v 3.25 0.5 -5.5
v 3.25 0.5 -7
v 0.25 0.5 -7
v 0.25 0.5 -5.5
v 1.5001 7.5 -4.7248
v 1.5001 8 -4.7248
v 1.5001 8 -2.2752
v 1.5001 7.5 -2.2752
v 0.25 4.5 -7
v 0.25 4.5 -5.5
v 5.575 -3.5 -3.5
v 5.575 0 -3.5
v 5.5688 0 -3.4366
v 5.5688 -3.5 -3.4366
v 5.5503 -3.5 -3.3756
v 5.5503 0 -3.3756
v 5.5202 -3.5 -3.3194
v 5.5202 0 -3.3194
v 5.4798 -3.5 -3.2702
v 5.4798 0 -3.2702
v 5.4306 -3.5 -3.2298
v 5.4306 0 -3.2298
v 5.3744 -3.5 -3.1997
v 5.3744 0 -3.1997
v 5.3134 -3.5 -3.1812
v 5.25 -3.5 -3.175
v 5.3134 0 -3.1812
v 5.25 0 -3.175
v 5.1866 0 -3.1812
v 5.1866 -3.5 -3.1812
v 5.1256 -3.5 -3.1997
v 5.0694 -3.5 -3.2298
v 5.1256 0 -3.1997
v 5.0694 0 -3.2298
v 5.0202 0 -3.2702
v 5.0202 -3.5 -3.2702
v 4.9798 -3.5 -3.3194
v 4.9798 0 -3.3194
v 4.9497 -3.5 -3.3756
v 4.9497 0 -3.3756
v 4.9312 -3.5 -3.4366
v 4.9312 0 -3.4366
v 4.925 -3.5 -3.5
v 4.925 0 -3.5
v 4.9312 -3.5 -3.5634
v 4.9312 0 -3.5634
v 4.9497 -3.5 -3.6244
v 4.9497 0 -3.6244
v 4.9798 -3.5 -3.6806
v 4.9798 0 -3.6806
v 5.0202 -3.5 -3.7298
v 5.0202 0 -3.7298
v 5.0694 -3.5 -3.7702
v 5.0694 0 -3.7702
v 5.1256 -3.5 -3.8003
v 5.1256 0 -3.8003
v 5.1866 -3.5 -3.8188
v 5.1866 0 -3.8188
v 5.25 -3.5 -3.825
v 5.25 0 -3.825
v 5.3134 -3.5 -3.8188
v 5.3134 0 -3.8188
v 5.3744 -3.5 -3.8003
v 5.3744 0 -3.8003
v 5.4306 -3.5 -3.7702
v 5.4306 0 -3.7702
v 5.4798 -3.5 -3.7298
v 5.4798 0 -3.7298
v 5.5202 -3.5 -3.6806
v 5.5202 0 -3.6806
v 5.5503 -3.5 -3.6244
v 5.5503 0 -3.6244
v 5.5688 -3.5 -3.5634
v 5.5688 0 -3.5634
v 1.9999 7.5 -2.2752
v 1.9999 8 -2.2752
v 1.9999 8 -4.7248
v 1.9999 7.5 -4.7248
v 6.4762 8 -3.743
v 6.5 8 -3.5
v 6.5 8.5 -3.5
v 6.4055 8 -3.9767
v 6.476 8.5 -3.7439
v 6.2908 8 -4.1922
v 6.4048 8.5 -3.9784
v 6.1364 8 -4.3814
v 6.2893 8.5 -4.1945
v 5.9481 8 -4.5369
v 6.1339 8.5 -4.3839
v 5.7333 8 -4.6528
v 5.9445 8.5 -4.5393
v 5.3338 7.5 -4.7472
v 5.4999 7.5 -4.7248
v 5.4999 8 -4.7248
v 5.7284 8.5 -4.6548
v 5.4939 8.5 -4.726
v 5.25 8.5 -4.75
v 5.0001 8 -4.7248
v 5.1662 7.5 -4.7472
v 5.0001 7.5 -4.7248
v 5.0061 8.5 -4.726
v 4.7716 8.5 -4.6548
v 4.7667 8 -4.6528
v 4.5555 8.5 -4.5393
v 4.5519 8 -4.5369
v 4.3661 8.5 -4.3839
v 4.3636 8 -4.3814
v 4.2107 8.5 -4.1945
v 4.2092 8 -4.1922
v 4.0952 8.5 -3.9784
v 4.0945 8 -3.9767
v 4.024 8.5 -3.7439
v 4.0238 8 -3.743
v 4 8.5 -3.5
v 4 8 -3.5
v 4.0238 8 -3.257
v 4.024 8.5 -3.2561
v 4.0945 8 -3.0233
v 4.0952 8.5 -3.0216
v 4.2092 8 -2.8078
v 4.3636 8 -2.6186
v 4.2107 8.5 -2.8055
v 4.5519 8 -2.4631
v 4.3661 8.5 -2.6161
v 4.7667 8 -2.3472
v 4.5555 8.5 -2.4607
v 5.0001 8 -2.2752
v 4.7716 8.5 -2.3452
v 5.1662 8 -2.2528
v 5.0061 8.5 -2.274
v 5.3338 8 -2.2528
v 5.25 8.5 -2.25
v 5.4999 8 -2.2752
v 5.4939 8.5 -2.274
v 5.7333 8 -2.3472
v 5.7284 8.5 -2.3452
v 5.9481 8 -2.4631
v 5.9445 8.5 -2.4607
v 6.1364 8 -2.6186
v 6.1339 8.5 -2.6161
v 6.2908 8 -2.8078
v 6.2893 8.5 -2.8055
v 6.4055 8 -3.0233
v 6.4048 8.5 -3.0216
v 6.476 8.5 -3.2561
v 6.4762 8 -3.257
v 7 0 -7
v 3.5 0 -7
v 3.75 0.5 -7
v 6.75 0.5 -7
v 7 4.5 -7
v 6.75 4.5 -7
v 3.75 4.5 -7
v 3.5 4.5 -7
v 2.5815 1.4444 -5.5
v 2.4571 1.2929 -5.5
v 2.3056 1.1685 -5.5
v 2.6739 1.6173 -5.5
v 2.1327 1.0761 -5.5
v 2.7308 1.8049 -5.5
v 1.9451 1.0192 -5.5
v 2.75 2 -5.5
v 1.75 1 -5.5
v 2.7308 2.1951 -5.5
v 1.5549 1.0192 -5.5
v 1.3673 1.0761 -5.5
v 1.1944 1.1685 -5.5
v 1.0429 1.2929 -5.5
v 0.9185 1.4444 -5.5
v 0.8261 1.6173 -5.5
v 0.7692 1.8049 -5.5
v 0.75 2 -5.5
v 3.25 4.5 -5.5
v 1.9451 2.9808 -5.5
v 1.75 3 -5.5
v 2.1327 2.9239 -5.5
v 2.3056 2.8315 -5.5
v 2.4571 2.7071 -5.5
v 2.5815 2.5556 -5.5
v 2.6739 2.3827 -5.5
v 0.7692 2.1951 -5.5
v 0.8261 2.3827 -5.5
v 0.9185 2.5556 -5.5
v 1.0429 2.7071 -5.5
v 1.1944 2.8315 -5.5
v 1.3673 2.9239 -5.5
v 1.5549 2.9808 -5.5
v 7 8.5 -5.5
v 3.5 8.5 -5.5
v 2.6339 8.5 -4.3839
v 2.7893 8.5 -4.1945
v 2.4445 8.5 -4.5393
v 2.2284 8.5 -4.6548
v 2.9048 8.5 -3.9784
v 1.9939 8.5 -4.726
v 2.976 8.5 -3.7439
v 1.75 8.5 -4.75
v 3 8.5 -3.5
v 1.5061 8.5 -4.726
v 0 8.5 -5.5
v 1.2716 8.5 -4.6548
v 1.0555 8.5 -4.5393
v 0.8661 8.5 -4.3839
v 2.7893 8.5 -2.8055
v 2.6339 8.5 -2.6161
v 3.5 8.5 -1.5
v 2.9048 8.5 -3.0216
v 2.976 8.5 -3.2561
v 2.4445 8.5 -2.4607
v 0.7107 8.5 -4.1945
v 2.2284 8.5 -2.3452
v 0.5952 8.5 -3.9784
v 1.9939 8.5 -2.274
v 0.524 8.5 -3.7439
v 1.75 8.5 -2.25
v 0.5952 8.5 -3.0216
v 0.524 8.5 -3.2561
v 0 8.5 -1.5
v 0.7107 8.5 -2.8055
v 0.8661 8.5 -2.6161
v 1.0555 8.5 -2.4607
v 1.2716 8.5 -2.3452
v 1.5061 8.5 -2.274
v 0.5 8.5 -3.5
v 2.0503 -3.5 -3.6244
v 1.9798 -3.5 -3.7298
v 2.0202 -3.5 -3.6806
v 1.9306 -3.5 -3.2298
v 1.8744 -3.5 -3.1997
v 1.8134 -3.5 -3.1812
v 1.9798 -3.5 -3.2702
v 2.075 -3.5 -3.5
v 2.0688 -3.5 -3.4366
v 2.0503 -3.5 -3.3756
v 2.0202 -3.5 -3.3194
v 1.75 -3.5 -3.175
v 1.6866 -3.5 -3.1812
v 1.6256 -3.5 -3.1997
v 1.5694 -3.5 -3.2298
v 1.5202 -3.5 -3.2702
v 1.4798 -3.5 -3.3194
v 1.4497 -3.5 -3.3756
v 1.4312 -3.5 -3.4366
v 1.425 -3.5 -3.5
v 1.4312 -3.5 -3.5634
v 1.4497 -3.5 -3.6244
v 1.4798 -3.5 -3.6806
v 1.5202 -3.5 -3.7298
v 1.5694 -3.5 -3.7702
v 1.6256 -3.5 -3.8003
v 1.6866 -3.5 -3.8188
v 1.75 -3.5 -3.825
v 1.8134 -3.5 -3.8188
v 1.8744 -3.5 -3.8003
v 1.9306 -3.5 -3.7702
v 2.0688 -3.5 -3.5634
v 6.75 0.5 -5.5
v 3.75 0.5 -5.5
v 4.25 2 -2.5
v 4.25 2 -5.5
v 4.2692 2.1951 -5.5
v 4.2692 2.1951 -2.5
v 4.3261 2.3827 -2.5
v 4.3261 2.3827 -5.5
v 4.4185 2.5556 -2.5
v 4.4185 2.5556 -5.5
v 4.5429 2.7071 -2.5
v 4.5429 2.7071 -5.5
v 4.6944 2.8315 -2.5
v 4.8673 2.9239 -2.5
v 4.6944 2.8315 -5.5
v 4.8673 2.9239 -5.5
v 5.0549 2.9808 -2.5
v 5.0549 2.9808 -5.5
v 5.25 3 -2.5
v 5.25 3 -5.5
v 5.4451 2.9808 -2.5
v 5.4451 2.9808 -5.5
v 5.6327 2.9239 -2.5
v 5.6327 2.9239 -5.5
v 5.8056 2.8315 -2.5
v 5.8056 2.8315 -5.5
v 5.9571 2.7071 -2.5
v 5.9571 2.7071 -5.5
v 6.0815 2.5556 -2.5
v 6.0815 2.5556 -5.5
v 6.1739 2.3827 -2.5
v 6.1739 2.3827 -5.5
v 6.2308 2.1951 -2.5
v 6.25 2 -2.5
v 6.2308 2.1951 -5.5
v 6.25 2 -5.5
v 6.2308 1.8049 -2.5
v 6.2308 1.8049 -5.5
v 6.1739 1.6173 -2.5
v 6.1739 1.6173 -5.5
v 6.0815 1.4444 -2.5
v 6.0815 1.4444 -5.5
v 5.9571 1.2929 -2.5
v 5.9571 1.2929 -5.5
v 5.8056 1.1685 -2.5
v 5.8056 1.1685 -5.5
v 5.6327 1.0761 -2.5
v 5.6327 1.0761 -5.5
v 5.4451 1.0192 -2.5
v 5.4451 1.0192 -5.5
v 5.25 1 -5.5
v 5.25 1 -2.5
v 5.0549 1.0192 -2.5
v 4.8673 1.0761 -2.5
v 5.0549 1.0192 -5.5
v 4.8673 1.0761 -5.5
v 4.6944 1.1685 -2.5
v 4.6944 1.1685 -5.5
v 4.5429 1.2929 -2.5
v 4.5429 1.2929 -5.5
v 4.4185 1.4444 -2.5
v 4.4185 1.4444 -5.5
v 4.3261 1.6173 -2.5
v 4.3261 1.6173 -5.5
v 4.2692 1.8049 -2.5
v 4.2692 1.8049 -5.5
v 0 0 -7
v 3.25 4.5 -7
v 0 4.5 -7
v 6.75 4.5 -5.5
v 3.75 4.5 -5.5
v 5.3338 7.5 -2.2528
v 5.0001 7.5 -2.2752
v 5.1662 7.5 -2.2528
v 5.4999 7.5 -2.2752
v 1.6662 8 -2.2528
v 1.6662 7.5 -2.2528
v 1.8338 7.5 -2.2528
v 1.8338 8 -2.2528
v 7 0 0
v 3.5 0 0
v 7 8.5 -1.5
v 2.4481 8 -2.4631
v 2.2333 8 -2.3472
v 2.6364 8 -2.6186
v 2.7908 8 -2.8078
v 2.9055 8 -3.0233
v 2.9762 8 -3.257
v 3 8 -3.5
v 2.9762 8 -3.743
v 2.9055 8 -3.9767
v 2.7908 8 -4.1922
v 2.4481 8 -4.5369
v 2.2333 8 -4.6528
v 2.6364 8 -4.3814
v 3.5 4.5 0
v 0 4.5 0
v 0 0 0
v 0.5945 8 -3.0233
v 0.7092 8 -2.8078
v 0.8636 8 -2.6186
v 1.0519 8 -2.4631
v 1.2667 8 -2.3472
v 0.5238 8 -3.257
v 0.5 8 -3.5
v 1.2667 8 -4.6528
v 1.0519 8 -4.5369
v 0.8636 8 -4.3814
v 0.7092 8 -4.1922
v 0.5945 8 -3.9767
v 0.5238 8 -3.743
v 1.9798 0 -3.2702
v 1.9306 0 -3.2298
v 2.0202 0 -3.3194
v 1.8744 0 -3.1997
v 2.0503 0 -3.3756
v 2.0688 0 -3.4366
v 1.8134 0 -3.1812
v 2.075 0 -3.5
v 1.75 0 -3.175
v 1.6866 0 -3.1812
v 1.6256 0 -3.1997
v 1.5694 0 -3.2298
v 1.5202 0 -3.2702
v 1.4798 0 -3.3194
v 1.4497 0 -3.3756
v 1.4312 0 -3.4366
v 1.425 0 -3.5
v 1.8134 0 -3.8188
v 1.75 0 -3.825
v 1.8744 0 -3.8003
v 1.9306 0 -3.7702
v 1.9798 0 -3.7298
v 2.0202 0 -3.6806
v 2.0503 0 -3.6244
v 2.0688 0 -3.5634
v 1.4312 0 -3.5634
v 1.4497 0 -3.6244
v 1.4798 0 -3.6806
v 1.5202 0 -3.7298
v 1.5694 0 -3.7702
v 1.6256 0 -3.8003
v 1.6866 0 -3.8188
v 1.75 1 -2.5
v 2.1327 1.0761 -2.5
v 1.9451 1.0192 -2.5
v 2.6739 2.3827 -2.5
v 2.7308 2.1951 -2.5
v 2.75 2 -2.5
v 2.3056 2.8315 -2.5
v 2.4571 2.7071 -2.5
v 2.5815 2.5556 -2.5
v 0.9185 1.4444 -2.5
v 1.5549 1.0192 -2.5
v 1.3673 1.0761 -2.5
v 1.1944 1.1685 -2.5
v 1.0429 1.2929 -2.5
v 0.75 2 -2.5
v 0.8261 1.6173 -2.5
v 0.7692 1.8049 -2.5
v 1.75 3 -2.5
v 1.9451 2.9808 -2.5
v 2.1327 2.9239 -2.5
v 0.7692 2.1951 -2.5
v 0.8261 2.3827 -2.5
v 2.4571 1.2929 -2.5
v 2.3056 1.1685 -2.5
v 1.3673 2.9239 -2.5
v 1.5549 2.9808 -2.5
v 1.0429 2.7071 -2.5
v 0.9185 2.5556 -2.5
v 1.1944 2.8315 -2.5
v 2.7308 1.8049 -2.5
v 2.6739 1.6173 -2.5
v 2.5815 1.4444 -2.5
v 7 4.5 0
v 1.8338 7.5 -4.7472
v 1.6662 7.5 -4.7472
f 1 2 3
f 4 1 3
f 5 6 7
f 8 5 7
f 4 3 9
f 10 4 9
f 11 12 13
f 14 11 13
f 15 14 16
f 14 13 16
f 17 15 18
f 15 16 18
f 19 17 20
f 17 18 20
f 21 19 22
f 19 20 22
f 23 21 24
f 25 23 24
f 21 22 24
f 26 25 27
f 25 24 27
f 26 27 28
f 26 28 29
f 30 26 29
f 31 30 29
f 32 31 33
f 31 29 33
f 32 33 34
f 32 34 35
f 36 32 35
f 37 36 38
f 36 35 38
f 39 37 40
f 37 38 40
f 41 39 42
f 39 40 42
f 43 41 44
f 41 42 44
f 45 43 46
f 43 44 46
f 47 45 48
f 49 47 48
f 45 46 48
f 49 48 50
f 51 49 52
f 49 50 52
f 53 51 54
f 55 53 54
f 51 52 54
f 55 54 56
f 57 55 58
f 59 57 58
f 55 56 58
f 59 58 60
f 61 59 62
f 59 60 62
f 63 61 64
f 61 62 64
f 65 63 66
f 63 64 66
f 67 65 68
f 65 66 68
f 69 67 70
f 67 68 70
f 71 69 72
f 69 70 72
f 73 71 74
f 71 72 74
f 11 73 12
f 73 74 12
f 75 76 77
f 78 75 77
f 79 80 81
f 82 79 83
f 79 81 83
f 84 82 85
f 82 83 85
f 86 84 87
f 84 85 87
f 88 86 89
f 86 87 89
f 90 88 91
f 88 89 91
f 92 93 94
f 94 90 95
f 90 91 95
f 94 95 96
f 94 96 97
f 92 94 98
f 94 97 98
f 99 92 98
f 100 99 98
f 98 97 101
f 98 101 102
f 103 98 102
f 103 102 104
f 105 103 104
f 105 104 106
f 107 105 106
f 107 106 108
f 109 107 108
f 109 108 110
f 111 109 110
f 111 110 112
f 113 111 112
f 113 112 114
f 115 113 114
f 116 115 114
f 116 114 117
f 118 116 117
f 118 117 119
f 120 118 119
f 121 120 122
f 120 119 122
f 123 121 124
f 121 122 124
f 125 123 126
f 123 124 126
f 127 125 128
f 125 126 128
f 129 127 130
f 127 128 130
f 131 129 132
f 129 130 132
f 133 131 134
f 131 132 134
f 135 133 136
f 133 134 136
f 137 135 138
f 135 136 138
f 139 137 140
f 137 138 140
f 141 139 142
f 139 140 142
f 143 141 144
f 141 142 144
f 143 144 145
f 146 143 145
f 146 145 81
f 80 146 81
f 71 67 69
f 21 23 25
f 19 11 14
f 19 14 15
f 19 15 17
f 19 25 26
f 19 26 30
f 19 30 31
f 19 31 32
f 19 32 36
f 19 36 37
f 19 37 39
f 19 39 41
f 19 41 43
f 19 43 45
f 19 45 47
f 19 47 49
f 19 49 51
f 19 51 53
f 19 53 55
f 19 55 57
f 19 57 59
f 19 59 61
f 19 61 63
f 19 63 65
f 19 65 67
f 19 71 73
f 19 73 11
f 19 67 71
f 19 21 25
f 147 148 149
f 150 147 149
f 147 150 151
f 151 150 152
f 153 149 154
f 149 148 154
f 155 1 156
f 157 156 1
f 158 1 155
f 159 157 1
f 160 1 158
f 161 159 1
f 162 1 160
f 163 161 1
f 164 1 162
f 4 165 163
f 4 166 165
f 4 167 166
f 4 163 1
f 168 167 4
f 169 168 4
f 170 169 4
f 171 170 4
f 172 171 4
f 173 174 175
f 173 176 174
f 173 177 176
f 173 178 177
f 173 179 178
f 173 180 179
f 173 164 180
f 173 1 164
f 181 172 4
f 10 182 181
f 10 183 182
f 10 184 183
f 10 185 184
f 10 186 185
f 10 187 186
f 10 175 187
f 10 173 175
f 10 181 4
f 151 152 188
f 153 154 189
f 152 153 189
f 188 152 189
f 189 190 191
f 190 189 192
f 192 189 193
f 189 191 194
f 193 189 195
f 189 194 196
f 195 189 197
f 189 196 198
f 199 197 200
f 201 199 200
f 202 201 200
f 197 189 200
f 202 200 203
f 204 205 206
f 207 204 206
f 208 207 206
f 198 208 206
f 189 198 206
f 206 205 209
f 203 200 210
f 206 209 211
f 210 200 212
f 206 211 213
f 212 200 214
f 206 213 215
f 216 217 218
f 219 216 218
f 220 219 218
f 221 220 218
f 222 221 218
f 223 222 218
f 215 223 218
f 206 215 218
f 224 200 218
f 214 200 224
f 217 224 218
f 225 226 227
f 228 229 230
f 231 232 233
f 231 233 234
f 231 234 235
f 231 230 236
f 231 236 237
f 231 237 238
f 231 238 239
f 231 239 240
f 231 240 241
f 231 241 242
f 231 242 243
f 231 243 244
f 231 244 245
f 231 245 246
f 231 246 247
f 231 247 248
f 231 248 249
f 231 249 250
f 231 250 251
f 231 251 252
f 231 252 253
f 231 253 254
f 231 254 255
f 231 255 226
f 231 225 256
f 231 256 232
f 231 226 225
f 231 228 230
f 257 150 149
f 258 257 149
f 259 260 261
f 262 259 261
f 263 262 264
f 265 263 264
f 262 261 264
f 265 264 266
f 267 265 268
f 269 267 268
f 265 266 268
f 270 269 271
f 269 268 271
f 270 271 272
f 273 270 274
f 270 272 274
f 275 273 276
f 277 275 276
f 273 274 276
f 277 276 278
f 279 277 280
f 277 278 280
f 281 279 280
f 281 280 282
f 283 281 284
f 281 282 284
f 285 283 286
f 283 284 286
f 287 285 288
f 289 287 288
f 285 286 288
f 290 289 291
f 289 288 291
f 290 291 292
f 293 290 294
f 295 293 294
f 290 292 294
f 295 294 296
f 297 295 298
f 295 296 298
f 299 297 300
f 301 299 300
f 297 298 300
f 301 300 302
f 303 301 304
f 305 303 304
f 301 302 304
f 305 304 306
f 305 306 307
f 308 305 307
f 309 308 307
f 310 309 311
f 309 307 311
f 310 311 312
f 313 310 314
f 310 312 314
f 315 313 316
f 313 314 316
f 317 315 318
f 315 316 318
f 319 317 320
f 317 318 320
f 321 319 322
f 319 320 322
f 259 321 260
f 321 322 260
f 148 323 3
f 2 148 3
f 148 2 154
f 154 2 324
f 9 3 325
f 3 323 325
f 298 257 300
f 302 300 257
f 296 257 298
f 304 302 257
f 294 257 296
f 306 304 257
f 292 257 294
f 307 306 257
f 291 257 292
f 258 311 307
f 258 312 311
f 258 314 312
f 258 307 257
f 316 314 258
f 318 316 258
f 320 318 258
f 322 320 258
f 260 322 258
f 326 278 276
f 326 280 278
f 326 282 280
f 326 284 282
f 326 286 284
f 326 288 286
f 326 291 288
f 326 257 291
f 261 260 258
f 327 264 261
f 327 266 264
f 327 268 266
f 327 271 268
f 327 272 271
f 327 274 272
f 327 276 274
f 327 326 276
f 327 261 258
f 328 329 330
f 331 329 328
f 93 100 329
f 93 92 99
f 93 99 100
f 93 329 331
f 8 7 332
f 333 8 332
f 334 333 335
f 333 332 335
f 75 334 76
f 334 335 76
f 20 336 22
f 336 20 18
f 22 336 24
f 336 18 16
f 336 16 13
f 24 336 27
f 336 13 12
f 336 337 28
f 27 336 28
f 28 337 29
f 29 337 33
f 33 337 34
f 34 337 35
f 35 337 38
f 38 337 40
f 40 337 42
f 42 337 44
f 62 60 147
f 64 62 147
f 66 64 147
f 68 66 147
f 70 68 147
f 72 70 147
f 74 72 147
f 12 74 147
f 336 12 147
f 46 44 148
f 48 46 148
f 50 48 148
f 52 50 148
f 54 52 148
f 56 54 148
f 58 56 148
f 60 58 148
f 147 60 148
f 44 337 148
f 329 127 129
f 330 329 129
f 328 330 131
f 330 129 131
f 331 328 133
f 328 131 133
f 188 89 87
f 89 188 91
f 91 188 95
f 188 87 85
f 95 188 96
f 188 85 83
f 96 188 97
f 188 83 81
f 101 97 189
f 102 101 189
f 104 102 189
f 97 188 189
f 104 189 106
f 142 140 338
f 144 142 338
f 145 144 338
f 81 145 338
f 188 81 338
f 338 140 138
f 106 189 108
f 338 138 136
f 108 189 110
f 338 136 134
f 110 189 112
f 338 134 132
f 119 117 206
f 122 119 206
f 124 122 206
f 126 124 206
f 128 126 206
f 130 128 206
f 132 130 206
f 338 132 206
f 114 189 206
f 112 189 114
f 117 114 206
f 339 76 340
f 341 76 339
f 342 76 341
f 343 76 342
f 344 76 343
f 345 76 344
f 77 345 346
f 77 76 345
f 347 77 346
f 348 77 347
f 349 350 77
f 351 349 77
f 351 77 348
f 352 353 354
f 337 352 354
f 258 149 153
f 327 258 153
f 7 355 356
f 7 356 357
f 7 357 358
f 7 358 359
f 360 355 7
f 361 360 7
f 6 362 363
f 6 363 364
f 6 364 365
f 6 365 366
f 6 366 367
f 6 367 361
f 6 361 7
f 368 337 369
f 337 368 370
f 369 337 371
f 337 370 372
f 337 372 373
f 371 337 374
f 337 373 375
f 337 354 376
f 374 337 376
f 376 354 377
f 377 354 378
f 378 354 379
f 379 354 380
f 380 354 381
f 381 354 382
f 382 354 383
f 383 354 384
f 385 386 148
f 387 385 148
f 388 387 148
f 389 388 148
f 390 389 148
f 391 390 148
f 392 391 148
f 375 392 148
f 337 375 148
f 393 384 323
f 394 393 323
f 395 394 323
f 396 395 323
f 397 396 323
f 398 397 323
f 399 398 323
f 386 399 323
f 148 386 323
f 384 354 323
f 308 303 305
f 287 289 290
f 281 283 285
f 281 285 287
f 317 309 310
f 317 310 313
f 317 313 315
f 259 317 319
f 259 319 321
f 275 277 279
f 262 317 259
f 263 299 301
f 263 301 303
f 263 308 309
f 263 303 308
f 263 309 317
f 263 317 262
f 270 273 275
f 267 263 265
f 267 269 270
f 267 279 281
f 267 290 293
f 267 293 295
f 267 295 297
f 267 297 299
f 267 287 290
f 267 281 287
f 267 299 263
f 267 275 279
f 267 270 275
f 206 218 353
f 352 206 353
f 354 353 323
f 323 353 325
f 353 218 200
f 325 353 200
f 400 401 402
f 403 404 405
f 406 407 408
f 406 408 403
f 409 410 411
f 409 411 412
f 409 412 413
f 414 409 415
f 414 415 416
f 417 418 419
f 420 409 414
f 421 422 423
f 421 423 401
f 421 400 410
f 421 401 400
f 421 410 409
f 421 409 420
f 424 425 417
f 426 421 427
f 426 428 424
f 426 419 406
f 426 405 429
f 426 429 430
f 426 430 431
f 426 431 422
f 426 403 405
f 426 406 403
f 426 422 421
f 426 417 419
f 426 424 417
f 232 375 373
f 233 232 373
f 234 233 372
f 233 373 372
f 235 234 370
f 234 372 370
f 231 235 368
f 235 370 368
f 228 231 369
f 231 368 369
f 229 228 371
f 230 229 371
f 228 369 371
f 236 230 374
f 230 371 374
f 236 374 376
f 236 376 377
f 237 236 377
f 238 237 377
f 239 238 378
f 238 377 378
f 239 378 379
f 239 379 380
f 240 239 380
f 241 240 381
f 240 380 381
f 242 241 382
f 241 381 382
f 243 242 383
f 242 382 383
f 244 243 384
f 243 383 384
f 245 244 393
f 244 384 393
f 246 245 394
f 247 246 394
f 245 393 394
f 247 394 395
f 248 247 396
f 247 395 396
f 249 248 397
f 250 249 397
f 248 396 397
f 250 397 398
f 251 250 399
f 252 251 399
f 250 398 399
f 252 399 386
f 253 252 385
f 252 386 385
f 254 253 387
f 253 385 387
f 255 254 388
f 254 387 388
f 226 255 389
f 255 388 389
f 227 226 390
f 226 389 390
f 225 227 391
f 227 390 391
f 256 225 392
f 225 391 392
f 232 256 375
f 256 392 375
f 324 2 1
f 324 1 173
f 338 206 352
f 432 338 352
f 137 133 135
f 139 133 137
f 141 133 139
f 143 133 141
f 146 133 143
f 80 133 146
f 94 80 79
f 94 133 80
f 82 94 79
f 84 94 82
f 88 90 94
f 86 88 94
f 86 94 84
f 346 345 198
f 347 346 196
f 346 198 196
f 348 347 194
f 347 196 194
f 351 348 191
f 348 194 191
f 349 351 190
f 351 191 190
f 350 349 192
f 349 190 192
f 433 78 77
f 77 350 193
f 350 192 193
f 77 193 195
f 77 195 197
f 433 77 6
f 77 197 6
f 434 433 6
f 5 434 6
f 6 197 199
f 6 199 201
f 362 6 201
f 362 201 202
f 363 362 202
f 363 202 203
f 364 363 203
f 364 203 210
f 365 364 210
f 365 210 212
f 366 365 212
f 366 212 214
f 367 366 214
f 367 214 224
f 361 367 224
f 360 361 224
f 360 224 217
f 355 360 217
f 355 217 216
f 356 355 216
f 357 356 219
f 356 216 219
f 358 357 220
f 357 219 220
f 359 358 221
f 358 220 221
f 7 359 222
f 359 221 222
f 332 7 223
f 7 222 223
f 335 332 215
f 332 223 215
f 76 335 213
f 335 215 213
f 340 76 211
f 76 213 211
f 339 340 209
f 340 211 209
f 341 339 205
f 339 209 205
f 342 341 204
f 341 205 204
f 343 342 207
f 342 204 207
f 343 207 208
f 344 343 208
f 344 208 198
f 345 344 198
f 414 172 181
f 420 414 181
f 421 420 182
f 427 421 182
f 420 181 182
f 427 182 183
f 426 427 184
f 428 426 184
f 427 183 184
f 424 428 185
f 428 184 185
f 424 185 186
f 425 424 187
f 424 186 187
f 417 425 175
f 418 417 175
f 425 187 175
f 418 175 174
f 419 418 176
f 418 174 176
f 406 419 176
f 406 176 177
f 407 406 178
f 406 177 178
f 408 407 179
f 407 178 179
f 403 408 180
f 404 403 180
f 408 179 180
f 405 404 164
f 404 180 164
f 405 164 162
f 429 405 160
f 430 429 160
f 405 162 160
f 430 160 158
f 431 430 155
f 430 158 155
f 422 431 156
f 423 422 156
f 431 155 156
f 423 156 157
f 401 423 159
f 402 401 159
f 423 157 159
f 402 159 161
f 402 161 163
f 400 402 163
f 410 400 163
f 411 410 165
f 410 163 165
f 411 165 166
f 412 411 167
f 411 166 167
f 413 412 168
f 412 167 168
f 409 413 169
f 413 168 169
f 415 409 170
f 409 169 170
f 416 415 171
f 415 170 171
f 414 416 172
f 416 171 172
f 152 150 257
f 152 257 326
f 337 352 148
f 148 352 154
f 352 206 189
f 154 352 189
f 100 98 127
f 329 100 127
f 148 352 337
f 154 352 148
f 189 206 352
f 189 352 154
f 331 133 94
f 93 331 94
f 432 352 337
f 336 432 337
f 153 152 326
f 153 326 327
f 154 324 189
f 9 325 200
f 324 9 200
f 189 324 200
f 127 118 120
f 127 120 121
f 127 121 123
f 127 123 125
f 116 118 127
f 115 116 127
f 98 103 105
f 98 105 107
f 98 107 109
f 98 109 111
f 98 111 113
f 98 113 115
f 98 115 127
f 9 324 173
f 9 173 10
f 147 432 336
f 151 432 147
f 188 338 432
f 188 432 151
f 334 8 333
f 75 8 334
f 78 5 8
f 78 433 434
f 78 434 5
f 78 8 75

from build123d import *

# Parameters (mm, degrees)
EXTRUDE_1_DEPTH     = 3.5
SKETCH_3_W          = 3
SKETCH_3_H          = 4
CUT_EXTRUDE_1_DEPTH = 1.5
SKETCH_4_R          = 1.25
CUT_EXTRUDE_2_DEPTH = 0.5
CUT_EXTRUDE_3_DEPTH = 0.5
SKETCH_7_R          = 1
CUT_EXTRUDE_4_DEPTH = 3
SKETCH1_R           = 0.325
BOSS_EXTRUDE1_DEPTH = 3.5
LPATTERN1_COUNT     = 2
LPATTERN1_PITCH     = 3.5


with BuildPart() as part:
    # 스케치1 → 보스-돌출1 (new body)
    with BuildSketch(Plane(origin=(0, 0, 0), x_dir=(0, 0, -1), z_dir=(1, 0, 0))):
        Polygon((0, 0), (7, 0), (7, 4.5), (5.5, 8.5), (1.5, 8.5), (0, 4.5), align=None)
    extrude(amount=EXTRUDE_1_DEPTH)

    # 스케치3 → 컷-돌출1 (cut)
    with BuildSketch(Plane(origin=(0, 0, -7), x_dir=(-1, 0, 0), z_dir=(0, 0, -1))):
        with Locations((-1.75, 2.5)):
            Rectangle(SKETCH_3_W, SKETCH_3_H)
    extrude(amount=-CUT_EXTRUDE_1_DEPTH, mode=Mode.SUBTRACT)

    # 스케치4 → 컷-돌출2 (cut)
    with BuildSketch(Plane(origin=(0, 8.5, 0), x_dir=(1, 0, 0), z_dir=(0, 1, 0))):
        with Locations((1.75, 3.5)):
            Circle(SKETCH_4_R)
    extrude(amount=-CUT_EXTRUDE_2_DEPTH, mode=Mode.SUBTRACT)

    # 스케치5 → 컷-돌출3 (cut)
    with BuildSketch(Plane(origin=(0, 8, 0), x_dir=(1, 0, 0), z_dir=(0, 1, 0))):
        with BuildLine():
            Line((1.500050042, 4.724755085), (1.500050042, 2.275244915))
            ThreePointArc((1.500050042, 2.275244915), (1.75, 2.25), (1.999949958, 2.275244915))
            Line((1.999949958, 2.275244915), (1.999949958, 4.724755085))
            ThreePointArc((1.999949958, 4.724755085), (1.75, 4.75), (1.500050042, 4.724755085))
        make_face()
    extrude(amount=-CUT_EXTRUDE_3_DEPTH, mode=Mode.SUBTRACT)

    # 스케치7 → 컷-돌출4 (cut)
    with BuildSketch(Plane(origin=(0, 0, -5.5), x_dir=(-1, 0, 0), z_dir=(0, 0, -1))):
        with Locations((-1.75, 2)):
            Circle(SKETCH_7_R)
    extrude(amount=-CUT_EXTRUDE_4_DEPTH, mode=Mode.SUBTRACT)

    # Sketch1 → Boss-Extrude1 (add)
    with BuildSketch(Plane.XZ):
        with Locations((1.75, -3.5)):
            Circle(SKETCH1_R)
    extrude(amount=BOSS_EXTRUDE1_DEPTH)


with BuildPart() as lpattern1_1:
    # LPattern1: pattern copy
    add(part.part.moved(Location(Vector(1, 0, 0) * (1 * LPATTERN1_PITCH))))


solid = Compound([part.part, lpattern1_1.part])
